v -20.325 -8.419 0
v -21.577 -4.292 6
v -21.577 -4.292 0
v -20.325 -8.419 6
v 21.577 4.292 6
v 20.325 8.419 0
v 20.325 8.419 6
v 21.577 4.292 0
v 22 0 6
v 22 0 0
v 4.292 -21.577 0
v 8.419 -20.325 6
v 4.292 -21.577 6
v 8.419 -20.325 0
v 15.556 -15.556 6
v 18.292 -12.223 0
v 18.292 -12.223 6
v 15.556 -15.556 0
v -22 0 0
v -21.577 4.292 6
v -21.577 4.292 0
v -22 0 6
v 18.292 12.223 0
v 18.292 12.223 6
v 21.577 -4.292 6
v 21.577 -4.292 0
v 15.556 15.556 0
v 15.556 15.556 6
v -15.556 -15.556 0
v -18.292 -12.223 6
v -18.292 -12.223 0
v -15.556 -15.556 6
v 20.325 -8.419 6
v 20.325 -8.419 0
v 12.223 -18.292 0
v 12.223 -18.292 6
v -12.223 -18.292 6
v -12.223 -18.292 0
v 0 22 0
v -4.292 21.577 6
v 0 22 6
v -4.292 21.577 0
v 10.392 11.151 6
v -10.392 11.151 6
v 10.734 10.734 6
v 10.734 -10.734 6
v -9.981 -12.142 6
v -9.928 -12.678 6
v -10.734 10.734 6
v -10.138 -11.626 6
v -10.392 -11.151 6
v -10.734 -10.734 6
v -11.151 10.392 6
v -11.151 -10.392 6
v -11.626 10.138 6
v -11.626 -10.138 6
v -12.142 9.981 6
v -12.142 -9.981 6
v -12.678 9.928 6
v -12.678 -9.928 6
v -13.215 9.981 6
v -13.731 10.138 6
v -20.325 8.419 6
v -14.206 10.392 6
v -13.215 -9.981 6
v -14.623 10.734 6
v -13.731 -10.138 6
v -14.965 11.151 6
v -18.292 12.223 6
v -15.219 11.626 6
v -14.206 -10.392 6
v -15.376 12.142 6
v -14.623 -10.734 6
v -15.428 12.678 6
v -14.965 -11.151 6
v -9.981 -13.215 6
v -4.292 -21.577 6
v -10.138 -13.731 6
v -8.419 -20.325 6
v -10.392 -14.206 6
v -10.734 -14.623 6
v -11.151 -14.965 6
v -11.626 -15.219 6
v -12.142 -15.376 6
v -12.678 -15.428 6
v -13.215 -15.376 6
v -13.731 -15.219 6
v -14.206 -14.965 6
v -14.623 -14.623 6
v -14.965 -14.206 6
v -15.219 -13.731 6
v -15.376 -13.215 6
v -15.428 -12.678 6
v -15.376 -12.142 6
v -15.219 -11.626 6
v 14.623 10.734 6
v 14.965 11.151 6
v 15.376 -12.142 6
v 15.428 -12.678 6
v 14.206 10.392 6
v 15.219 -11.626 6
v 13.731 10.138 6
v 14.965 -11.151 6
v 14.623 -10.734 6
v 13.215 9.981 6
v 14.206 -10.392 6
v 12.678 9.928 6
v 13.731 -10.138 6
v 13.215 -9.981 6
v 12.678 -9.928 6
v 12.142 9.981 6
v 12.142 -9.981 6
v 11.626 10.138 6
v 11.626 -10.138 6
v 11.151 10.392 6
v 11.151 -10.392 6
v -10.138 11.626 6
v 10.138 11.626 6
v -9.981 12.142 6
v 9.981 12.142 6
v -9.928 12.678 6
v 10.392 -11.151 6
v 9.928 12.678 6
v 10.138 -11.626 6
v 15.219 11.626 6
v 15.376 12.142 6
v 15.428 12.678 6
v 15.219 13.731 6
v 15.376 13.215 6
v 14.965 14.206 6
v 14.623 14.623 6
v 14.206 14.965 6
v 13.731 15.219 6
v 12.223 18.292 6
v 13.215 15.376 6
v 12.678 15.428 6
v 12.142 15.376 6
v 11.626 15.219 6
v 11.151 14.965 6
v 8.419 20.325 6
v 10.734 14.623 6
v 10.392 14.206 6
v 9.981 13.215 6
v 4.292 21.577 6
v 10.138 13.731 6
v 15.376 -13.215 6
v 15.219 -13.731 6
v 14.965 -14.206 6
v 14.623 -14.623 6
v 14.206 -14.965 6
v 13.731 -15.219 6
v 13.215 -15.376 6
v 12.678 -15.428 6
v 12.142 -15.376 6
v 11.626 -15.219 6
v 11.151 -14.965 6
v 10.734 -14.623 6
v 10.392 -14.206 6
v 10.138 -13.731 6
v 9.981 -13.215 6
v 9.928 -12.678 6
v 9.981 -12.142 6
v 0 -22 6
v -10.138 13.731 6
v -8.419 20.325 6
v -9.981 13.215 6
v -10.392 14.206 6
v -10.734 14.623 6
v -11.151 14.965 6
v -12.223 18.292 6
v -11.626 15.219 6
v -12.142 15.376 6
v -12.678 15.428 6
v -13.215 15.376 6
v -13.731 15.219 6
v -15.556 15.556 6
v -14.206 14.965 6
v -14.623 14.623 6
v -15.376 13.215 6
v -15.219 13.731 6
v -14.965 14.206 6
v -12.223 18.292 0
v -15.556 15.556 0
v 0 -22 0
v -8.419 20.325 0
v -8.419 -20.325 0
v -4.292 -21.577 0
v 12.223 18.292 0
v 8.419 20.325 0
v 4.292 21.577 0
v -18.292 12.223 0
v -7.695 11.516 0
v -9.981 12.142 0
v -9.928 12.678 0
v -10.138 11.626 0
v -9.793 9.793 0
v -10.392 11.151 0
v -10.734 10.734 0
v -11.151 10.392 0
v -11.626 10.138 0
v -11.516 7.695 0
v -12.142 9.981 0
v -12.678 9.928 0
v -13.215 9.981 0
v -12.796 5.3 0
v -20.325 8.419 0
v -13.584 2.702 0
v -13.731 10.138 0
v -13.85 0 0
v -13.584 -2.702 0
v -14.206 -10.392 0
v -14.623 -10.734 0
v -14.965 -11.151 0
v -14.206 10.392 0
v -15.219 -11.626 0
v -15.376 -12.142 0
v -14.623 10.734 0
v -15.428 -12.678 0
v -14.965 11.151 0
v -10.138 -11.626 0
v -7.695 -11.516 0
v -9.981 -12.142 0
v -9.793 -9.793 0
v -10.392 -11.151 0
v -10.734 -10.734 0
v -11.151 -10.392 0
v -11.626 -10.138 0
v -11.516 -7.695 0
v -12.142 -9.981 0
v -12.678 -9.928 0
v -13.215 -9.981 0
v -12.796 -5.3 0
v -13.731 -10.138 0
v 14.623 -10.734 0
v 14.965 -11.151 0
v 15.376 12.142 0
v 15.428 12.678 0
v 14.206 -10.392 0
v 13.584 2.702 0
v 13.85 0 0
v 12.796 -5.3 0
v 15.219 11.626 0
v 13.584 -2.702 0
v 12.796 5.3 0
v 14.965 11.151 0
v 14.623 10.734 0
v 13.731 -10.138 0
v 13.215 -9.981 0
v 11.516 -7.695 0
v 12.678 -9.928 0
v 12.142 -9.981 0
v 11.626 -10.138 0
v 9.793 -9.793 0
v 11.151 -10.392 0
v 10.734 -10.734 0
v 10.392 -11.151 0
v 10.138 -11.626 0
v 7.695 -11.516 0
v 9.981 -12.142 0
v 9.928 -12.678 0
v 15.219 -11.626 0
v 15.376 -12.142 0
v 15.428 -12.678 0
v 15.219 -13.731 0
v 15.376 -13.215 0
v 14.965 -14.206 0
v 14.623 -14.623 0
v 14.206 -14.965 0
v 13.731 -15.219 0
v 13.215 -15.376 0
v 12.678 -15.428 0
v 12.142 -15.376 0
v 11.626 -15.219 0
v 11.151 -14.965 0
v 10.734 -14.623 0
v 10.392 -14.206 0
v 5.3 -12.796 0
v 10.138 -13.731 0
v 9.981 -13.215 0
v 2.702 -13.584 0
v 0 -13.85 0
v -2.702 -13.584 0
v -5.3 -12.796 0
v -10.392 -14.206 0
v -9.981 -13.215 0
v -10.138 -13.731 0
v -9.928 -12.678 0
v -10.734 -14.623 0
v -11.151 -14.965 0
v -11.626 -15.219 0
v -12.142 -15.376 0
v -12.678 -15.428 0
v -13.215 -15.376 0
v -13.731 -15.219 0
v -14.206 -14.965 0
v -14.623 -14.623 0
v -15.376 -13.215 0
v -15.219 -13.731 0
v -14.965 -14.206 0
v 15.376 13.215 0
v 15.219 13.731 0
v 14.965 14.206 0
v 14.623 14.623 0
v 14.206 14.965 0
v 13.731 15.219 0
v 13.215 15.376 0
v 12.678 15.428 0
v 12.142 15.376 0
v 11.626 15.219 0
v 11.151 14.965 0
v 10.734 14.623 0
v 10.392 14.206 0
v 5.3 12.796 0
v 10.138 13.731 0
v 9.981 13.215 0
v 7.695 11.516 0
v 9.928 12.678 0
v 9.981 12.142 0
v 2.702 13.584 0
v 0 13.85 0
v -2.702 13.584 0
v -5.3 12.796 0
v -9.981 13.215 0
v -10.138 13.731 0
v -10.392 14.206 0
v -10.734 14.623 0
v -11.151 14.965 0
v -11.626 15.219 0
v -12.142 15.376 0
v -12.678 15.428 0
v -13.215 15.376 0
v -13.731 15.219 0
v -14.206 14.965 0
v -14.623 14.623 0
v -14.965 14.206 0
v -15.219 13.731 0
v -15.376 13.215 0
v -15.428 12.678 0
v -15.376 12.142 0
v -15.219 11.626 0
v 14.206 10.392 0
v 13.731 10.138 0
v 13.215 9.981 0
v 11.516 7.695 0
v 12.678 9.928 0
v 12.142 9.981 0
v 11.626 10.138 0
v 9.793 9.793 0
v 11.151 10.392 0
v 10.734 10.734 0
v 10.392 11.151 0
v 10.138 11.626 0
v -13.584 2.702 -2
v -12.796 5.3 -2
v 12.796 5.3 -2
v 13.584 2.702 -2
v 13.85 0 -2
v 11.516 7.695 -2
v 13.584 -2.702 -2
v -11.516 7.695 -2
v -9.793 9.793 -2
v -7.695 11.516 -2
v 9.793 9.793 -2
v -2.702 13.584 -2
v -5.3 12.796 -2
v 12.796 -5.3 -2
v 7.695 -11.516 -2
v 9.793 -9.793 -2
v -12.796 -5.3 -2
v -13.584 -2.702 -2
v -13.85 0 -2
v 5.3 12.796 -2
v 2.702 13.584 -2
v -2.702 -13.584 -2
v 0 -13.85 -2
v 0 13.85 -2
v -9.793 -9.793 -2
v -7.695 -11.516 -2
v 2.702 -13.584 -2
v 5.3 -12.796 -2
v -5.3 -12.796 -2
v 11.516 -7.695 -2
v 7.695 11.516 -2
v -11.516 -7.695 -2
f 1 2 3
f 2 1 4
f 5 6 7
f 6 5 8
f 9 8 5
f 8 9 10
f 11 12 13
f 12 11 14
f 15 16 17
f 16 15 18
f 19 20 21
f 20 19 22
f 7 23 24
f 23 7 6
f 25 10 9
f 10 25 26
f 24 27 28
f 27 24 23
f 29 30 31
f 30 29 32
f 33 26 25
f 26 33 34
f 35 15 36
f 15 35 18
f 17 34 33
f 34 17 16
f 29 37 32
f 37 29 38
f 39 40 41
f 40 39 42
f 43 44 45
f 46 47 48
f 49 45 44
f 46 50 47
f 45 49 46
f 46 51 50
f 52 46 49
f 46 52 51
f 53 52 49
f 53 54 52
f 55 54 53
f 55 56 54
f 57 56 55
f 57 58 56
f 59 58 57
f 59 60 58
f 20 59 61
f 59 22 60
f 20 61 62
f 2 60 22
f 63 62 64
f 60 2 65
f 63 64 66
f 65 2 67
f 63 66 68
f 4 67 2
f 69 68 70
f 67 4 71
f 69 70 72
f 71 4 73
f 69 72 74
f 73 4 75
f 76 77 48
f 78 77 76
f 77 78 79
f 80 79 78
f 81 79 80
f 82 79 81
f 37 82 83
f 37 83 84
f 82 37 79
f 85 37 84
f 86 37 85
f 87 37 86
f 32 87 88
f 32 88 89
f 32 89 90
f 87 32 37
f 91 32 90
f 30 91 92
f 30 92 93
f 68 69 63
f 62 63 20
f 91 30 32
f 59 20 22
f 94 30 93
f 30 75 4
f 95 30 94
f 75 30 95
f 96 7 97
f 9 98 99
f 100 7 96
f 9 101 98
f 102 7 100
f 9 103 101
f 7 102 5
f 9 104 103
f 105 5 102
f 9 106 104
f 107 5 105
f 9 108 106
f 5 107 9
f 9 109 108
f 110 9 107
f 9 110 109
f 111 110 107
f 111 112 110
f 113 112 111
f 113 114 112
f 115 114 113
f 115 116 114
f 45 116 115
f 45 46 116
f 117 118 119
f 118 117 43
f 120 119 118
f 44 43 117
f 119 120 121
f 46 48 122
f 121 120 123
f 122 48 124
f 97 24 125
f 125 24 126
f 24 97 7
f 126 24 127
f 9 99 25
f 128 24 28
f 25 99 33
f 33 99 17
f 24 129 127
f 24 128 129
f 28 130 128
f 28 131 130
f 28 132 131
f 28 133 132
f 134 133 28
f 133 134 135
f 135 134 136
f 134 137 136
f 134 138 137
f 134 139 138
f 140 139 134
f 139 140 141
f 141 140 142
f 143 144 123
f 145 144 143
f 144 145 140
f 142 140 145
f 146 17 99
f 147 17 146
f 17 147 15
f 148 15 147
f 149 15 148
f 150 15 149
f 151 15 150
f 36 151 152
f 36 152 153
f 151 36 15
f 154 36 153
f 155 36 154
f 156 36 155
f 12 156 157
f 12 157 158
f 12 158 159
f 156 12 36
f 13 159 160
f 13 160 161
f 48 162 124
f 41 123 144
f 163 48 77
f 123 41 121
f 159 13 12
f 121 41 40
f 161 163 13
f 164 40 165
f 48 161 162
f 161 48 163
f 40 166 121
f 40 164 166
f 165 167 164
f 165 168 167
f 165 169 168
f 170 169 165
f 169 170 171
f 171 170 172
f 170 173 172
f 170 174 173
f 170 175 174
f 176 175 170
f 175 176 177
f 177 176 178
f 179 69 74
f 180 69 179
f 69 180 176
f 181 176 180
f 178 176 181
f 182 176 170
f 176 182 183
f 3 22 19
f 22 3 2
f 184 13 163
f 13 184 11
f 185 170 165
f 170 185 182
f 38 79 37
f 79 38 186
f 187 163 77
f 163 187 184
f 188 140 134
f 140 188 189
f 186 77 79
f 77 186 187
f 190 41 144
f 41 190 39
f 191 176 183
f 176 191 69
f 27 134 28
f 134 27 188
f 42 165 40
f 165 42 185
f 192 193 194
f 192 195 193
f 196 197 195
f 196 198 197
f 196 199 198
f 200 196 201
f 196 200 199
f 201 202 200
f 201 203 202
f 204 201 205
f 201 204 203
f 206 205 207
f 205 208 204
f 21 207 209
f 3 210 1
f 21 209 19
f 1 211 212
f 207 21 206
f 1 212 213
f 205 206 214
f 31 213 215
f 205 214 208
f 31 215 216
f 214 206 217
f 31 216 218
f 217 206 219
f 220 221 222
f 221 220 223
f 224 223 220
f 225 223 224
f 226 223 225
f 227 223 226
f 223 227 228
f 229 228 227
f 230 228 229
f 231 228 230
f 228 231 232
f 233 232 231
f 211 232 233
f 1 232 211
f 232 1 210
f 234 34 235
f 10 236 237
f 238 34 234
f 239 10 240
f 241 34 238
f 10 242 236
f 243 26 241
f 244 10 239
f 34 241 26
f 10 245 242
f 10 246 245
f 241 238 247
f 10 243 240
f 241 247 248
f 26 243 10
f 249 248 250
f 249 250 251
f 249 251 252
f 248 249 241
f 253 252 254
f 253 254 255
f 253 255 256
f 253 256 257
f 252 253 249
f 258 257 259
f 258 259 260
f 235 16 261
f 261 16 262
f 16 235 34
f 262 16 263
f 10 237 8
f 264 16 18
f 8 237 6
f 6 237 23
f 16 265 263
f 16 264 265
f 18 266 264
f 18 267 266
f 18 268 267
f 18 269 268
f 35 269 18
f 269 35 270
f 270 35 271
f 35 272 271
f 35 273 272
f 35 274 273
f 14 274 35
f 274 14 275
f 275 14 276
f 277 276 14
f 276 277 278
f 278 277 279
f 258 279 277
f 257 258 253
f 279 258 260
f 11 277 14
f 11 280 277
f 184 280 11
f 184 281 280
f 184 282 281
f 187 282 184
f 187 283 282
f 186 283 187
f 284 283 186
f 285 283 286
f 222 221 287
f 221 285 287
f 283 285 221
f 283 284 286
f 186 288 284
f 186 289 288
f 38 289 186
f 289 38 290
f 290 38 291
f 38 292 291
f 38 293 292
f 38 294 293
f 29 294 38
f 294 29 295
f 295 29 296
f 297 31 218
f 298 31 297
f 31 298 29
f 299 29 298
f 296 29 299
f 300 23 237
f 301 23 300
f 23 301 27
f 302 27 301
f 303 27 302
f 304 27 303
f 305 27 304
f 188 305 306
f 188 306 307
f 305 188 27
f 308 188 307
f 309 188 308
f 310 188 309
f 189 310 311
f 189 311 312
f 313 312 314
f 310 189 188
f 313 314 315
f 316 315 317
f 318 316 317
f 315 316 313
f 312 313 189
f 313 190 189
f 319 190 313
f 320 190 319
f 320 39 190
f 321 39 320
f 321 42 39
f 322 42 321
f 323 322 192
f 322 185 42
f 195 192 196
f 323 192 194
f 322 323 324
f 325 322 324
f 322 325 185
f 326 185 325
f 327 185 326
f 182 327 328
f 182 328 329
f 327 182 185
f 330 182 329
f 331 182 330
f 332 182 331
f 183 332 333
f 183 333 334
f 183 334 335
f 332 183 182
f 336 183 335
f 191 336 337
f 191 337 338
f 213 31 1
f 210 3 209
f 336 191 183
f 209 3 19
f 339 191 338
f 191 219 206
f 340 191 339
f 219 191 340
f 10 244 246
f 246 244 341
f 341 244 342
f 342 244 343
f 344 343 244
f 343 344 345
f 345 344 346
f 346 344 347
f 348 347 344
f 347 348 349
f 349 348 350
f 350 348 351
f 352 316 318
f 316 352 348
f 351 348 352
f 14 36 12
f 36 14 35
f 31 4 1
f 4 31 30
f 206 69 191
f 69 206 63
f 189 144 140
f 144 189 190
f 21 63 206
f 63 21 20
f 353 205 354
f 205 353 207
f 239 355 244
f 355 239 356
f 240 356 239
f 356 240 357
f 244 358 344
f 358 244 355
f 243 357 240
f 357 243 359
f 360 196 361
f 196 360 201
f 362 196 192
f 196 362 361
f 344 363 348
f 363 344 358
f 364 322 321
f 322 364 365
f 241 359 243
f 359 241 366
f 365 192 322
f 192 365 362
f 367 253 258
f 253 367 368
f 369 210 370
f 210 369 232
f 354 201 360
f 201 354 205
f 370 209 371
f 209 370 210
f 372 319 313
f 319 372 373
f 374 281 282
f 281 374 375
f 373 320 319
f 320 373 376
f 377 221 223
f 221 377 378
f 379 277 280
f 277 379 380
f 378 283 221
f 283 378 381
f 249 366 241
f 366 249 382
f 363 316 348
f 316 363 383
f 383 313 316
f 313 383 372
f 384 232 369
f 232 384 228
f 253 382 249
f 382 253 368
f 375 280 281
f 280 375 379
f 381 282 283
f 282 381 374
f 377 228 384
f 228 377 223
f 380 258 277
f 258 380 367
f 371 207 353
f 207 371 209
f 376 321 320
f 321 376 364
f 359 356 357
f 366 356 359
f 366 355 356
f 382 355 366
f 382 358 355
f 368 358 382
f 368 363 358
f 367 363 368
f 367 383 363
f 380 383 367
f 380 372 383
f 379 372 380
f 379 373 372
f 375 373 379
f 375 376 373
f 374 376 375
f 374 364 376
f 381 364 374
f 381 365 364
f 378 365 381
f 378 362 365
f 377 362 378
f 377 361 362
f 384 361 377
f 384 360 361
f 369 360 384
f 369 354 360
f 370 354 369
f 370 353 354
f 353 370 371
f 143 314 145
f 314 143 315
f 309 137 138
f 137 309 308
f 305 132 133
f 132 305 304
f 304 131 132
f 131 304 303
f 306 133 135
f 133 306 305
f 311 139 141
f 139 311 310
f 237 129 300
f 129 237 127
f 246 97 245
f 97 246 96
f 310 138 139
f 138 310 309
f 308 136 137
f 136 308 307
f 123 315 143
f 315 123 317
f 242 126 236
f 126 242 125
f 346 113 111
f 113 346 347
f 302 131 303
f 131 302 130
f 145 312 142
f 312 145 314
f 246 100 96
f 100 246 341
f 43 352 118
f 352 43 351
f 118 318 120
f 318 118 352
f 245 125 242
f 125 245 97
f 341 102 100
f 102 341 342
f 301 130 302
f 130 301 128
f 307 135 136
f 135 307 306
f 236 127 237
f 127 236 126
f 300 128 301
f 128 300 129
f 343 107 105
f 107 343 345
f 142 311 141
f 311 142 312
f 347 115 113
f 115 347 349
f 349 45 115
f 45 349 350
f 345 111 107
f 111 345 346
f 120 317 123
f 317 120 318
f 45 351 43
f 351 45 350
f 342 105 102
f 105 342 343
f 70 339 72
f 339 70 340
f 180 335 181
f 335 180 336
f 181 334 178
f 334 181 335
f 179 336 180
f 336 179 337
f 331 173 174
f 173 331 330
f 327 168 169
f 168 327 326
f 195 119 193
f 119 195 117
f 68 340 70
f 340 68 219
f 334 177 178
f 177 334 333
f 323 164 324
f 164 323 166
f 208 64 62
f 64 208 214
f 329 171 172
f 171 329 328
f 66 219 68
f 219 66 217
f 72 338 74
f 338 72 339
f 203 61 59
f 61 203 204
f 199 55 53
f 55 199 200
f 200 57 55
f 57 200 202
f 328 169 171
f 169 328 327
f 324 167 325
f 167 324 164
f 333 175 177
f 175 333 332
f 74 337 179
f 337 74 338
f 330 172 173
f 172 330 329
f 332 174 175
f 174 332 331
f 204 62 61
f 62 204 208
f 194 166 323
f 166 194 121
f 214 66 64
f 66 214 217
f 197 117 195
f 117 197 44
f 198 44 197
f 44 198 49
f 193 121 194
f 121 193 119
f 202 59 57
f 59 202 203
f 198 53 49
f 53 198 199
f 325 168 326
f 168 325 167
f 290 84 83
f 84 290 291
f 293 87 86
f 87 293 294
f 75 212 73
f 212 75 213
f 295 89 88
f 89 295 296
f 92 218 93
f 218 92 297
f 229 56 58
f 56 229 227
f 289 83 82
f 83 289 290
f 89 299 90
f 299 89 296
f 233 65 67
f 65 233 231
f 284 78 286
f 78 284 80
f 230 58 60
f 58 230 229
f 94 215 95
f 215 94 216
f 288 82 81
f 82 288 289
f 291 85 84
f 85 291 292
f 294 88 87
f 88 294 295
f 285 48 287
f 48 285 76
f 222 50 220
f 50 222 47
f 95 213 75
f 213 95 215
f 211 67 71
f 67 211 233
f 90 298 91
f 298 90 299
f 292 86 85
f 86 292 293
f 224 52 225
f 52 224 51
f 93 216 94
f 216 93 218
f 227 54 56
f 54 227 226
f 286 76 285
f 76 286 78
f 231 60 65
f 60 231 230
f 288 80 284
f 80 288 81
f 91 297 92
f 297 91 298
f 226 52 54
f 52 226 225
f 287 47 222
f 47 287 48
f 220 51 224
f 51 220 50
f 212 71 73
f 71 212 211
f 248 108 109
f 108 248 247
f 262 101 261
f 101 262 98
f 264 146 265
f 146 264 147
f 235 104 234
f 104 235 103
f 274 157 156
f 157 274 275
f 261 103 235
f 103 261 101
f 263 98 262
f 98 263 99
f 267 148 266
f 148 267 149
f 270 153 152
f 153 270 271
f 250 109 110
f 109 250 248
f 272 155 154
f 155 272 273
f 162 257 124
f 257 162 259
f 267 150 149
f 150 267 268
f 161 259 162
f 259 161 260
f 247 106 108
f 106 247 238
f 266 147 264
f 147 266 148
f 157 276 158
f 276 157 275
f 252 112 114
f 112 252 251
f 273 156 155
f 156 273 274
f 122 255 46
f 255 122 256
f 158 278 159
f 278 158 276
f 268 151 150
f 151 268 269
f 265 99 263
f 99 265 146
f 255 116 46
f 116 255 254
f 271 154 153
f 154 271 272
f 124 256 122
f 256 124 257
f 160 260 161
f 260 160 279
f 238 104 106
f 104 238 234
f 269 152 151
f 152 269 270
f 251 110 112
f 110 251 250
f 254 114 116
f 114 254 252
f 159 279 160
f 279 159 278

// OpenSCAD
$fn = 32;

// ----------------------------------------------------------------------
// Retaining cap: 6001 cover, 44 mm, spigot 27.7 mm
// ----------------------------------------------------------------------

// --- parameters (mm) ---
cap_d = 44;               // cover diameter
cap_t = 6;                // cover thickness
lip_d = 27.7;             // spigot that enters the housing
lip_h = 2;                // spigot height
bolt_d = 5.5;             // bolt clearance
bolt_r = 17.93;           // bolt circle radius

module cover() {
  cylinder(h = cap_t, d = cap_d);
}

module spigot() {
  /* sunk 1 mm into the cover; the spigot sets the overall height */
  translate([0, 0, -lip_h]) cylinder(h = lip_h + 1, d = lip_d);
}

difference() {
  union() {
    cover();
    spigot();
  }
  for (i = [0 : 3]) rotate([0, 0, 45 + i * 90]) translate([bolt_r, 0, -lip_h - 1])
    cylinder(h = lip_h + cap_t + 2, d = bolt_d);
}
